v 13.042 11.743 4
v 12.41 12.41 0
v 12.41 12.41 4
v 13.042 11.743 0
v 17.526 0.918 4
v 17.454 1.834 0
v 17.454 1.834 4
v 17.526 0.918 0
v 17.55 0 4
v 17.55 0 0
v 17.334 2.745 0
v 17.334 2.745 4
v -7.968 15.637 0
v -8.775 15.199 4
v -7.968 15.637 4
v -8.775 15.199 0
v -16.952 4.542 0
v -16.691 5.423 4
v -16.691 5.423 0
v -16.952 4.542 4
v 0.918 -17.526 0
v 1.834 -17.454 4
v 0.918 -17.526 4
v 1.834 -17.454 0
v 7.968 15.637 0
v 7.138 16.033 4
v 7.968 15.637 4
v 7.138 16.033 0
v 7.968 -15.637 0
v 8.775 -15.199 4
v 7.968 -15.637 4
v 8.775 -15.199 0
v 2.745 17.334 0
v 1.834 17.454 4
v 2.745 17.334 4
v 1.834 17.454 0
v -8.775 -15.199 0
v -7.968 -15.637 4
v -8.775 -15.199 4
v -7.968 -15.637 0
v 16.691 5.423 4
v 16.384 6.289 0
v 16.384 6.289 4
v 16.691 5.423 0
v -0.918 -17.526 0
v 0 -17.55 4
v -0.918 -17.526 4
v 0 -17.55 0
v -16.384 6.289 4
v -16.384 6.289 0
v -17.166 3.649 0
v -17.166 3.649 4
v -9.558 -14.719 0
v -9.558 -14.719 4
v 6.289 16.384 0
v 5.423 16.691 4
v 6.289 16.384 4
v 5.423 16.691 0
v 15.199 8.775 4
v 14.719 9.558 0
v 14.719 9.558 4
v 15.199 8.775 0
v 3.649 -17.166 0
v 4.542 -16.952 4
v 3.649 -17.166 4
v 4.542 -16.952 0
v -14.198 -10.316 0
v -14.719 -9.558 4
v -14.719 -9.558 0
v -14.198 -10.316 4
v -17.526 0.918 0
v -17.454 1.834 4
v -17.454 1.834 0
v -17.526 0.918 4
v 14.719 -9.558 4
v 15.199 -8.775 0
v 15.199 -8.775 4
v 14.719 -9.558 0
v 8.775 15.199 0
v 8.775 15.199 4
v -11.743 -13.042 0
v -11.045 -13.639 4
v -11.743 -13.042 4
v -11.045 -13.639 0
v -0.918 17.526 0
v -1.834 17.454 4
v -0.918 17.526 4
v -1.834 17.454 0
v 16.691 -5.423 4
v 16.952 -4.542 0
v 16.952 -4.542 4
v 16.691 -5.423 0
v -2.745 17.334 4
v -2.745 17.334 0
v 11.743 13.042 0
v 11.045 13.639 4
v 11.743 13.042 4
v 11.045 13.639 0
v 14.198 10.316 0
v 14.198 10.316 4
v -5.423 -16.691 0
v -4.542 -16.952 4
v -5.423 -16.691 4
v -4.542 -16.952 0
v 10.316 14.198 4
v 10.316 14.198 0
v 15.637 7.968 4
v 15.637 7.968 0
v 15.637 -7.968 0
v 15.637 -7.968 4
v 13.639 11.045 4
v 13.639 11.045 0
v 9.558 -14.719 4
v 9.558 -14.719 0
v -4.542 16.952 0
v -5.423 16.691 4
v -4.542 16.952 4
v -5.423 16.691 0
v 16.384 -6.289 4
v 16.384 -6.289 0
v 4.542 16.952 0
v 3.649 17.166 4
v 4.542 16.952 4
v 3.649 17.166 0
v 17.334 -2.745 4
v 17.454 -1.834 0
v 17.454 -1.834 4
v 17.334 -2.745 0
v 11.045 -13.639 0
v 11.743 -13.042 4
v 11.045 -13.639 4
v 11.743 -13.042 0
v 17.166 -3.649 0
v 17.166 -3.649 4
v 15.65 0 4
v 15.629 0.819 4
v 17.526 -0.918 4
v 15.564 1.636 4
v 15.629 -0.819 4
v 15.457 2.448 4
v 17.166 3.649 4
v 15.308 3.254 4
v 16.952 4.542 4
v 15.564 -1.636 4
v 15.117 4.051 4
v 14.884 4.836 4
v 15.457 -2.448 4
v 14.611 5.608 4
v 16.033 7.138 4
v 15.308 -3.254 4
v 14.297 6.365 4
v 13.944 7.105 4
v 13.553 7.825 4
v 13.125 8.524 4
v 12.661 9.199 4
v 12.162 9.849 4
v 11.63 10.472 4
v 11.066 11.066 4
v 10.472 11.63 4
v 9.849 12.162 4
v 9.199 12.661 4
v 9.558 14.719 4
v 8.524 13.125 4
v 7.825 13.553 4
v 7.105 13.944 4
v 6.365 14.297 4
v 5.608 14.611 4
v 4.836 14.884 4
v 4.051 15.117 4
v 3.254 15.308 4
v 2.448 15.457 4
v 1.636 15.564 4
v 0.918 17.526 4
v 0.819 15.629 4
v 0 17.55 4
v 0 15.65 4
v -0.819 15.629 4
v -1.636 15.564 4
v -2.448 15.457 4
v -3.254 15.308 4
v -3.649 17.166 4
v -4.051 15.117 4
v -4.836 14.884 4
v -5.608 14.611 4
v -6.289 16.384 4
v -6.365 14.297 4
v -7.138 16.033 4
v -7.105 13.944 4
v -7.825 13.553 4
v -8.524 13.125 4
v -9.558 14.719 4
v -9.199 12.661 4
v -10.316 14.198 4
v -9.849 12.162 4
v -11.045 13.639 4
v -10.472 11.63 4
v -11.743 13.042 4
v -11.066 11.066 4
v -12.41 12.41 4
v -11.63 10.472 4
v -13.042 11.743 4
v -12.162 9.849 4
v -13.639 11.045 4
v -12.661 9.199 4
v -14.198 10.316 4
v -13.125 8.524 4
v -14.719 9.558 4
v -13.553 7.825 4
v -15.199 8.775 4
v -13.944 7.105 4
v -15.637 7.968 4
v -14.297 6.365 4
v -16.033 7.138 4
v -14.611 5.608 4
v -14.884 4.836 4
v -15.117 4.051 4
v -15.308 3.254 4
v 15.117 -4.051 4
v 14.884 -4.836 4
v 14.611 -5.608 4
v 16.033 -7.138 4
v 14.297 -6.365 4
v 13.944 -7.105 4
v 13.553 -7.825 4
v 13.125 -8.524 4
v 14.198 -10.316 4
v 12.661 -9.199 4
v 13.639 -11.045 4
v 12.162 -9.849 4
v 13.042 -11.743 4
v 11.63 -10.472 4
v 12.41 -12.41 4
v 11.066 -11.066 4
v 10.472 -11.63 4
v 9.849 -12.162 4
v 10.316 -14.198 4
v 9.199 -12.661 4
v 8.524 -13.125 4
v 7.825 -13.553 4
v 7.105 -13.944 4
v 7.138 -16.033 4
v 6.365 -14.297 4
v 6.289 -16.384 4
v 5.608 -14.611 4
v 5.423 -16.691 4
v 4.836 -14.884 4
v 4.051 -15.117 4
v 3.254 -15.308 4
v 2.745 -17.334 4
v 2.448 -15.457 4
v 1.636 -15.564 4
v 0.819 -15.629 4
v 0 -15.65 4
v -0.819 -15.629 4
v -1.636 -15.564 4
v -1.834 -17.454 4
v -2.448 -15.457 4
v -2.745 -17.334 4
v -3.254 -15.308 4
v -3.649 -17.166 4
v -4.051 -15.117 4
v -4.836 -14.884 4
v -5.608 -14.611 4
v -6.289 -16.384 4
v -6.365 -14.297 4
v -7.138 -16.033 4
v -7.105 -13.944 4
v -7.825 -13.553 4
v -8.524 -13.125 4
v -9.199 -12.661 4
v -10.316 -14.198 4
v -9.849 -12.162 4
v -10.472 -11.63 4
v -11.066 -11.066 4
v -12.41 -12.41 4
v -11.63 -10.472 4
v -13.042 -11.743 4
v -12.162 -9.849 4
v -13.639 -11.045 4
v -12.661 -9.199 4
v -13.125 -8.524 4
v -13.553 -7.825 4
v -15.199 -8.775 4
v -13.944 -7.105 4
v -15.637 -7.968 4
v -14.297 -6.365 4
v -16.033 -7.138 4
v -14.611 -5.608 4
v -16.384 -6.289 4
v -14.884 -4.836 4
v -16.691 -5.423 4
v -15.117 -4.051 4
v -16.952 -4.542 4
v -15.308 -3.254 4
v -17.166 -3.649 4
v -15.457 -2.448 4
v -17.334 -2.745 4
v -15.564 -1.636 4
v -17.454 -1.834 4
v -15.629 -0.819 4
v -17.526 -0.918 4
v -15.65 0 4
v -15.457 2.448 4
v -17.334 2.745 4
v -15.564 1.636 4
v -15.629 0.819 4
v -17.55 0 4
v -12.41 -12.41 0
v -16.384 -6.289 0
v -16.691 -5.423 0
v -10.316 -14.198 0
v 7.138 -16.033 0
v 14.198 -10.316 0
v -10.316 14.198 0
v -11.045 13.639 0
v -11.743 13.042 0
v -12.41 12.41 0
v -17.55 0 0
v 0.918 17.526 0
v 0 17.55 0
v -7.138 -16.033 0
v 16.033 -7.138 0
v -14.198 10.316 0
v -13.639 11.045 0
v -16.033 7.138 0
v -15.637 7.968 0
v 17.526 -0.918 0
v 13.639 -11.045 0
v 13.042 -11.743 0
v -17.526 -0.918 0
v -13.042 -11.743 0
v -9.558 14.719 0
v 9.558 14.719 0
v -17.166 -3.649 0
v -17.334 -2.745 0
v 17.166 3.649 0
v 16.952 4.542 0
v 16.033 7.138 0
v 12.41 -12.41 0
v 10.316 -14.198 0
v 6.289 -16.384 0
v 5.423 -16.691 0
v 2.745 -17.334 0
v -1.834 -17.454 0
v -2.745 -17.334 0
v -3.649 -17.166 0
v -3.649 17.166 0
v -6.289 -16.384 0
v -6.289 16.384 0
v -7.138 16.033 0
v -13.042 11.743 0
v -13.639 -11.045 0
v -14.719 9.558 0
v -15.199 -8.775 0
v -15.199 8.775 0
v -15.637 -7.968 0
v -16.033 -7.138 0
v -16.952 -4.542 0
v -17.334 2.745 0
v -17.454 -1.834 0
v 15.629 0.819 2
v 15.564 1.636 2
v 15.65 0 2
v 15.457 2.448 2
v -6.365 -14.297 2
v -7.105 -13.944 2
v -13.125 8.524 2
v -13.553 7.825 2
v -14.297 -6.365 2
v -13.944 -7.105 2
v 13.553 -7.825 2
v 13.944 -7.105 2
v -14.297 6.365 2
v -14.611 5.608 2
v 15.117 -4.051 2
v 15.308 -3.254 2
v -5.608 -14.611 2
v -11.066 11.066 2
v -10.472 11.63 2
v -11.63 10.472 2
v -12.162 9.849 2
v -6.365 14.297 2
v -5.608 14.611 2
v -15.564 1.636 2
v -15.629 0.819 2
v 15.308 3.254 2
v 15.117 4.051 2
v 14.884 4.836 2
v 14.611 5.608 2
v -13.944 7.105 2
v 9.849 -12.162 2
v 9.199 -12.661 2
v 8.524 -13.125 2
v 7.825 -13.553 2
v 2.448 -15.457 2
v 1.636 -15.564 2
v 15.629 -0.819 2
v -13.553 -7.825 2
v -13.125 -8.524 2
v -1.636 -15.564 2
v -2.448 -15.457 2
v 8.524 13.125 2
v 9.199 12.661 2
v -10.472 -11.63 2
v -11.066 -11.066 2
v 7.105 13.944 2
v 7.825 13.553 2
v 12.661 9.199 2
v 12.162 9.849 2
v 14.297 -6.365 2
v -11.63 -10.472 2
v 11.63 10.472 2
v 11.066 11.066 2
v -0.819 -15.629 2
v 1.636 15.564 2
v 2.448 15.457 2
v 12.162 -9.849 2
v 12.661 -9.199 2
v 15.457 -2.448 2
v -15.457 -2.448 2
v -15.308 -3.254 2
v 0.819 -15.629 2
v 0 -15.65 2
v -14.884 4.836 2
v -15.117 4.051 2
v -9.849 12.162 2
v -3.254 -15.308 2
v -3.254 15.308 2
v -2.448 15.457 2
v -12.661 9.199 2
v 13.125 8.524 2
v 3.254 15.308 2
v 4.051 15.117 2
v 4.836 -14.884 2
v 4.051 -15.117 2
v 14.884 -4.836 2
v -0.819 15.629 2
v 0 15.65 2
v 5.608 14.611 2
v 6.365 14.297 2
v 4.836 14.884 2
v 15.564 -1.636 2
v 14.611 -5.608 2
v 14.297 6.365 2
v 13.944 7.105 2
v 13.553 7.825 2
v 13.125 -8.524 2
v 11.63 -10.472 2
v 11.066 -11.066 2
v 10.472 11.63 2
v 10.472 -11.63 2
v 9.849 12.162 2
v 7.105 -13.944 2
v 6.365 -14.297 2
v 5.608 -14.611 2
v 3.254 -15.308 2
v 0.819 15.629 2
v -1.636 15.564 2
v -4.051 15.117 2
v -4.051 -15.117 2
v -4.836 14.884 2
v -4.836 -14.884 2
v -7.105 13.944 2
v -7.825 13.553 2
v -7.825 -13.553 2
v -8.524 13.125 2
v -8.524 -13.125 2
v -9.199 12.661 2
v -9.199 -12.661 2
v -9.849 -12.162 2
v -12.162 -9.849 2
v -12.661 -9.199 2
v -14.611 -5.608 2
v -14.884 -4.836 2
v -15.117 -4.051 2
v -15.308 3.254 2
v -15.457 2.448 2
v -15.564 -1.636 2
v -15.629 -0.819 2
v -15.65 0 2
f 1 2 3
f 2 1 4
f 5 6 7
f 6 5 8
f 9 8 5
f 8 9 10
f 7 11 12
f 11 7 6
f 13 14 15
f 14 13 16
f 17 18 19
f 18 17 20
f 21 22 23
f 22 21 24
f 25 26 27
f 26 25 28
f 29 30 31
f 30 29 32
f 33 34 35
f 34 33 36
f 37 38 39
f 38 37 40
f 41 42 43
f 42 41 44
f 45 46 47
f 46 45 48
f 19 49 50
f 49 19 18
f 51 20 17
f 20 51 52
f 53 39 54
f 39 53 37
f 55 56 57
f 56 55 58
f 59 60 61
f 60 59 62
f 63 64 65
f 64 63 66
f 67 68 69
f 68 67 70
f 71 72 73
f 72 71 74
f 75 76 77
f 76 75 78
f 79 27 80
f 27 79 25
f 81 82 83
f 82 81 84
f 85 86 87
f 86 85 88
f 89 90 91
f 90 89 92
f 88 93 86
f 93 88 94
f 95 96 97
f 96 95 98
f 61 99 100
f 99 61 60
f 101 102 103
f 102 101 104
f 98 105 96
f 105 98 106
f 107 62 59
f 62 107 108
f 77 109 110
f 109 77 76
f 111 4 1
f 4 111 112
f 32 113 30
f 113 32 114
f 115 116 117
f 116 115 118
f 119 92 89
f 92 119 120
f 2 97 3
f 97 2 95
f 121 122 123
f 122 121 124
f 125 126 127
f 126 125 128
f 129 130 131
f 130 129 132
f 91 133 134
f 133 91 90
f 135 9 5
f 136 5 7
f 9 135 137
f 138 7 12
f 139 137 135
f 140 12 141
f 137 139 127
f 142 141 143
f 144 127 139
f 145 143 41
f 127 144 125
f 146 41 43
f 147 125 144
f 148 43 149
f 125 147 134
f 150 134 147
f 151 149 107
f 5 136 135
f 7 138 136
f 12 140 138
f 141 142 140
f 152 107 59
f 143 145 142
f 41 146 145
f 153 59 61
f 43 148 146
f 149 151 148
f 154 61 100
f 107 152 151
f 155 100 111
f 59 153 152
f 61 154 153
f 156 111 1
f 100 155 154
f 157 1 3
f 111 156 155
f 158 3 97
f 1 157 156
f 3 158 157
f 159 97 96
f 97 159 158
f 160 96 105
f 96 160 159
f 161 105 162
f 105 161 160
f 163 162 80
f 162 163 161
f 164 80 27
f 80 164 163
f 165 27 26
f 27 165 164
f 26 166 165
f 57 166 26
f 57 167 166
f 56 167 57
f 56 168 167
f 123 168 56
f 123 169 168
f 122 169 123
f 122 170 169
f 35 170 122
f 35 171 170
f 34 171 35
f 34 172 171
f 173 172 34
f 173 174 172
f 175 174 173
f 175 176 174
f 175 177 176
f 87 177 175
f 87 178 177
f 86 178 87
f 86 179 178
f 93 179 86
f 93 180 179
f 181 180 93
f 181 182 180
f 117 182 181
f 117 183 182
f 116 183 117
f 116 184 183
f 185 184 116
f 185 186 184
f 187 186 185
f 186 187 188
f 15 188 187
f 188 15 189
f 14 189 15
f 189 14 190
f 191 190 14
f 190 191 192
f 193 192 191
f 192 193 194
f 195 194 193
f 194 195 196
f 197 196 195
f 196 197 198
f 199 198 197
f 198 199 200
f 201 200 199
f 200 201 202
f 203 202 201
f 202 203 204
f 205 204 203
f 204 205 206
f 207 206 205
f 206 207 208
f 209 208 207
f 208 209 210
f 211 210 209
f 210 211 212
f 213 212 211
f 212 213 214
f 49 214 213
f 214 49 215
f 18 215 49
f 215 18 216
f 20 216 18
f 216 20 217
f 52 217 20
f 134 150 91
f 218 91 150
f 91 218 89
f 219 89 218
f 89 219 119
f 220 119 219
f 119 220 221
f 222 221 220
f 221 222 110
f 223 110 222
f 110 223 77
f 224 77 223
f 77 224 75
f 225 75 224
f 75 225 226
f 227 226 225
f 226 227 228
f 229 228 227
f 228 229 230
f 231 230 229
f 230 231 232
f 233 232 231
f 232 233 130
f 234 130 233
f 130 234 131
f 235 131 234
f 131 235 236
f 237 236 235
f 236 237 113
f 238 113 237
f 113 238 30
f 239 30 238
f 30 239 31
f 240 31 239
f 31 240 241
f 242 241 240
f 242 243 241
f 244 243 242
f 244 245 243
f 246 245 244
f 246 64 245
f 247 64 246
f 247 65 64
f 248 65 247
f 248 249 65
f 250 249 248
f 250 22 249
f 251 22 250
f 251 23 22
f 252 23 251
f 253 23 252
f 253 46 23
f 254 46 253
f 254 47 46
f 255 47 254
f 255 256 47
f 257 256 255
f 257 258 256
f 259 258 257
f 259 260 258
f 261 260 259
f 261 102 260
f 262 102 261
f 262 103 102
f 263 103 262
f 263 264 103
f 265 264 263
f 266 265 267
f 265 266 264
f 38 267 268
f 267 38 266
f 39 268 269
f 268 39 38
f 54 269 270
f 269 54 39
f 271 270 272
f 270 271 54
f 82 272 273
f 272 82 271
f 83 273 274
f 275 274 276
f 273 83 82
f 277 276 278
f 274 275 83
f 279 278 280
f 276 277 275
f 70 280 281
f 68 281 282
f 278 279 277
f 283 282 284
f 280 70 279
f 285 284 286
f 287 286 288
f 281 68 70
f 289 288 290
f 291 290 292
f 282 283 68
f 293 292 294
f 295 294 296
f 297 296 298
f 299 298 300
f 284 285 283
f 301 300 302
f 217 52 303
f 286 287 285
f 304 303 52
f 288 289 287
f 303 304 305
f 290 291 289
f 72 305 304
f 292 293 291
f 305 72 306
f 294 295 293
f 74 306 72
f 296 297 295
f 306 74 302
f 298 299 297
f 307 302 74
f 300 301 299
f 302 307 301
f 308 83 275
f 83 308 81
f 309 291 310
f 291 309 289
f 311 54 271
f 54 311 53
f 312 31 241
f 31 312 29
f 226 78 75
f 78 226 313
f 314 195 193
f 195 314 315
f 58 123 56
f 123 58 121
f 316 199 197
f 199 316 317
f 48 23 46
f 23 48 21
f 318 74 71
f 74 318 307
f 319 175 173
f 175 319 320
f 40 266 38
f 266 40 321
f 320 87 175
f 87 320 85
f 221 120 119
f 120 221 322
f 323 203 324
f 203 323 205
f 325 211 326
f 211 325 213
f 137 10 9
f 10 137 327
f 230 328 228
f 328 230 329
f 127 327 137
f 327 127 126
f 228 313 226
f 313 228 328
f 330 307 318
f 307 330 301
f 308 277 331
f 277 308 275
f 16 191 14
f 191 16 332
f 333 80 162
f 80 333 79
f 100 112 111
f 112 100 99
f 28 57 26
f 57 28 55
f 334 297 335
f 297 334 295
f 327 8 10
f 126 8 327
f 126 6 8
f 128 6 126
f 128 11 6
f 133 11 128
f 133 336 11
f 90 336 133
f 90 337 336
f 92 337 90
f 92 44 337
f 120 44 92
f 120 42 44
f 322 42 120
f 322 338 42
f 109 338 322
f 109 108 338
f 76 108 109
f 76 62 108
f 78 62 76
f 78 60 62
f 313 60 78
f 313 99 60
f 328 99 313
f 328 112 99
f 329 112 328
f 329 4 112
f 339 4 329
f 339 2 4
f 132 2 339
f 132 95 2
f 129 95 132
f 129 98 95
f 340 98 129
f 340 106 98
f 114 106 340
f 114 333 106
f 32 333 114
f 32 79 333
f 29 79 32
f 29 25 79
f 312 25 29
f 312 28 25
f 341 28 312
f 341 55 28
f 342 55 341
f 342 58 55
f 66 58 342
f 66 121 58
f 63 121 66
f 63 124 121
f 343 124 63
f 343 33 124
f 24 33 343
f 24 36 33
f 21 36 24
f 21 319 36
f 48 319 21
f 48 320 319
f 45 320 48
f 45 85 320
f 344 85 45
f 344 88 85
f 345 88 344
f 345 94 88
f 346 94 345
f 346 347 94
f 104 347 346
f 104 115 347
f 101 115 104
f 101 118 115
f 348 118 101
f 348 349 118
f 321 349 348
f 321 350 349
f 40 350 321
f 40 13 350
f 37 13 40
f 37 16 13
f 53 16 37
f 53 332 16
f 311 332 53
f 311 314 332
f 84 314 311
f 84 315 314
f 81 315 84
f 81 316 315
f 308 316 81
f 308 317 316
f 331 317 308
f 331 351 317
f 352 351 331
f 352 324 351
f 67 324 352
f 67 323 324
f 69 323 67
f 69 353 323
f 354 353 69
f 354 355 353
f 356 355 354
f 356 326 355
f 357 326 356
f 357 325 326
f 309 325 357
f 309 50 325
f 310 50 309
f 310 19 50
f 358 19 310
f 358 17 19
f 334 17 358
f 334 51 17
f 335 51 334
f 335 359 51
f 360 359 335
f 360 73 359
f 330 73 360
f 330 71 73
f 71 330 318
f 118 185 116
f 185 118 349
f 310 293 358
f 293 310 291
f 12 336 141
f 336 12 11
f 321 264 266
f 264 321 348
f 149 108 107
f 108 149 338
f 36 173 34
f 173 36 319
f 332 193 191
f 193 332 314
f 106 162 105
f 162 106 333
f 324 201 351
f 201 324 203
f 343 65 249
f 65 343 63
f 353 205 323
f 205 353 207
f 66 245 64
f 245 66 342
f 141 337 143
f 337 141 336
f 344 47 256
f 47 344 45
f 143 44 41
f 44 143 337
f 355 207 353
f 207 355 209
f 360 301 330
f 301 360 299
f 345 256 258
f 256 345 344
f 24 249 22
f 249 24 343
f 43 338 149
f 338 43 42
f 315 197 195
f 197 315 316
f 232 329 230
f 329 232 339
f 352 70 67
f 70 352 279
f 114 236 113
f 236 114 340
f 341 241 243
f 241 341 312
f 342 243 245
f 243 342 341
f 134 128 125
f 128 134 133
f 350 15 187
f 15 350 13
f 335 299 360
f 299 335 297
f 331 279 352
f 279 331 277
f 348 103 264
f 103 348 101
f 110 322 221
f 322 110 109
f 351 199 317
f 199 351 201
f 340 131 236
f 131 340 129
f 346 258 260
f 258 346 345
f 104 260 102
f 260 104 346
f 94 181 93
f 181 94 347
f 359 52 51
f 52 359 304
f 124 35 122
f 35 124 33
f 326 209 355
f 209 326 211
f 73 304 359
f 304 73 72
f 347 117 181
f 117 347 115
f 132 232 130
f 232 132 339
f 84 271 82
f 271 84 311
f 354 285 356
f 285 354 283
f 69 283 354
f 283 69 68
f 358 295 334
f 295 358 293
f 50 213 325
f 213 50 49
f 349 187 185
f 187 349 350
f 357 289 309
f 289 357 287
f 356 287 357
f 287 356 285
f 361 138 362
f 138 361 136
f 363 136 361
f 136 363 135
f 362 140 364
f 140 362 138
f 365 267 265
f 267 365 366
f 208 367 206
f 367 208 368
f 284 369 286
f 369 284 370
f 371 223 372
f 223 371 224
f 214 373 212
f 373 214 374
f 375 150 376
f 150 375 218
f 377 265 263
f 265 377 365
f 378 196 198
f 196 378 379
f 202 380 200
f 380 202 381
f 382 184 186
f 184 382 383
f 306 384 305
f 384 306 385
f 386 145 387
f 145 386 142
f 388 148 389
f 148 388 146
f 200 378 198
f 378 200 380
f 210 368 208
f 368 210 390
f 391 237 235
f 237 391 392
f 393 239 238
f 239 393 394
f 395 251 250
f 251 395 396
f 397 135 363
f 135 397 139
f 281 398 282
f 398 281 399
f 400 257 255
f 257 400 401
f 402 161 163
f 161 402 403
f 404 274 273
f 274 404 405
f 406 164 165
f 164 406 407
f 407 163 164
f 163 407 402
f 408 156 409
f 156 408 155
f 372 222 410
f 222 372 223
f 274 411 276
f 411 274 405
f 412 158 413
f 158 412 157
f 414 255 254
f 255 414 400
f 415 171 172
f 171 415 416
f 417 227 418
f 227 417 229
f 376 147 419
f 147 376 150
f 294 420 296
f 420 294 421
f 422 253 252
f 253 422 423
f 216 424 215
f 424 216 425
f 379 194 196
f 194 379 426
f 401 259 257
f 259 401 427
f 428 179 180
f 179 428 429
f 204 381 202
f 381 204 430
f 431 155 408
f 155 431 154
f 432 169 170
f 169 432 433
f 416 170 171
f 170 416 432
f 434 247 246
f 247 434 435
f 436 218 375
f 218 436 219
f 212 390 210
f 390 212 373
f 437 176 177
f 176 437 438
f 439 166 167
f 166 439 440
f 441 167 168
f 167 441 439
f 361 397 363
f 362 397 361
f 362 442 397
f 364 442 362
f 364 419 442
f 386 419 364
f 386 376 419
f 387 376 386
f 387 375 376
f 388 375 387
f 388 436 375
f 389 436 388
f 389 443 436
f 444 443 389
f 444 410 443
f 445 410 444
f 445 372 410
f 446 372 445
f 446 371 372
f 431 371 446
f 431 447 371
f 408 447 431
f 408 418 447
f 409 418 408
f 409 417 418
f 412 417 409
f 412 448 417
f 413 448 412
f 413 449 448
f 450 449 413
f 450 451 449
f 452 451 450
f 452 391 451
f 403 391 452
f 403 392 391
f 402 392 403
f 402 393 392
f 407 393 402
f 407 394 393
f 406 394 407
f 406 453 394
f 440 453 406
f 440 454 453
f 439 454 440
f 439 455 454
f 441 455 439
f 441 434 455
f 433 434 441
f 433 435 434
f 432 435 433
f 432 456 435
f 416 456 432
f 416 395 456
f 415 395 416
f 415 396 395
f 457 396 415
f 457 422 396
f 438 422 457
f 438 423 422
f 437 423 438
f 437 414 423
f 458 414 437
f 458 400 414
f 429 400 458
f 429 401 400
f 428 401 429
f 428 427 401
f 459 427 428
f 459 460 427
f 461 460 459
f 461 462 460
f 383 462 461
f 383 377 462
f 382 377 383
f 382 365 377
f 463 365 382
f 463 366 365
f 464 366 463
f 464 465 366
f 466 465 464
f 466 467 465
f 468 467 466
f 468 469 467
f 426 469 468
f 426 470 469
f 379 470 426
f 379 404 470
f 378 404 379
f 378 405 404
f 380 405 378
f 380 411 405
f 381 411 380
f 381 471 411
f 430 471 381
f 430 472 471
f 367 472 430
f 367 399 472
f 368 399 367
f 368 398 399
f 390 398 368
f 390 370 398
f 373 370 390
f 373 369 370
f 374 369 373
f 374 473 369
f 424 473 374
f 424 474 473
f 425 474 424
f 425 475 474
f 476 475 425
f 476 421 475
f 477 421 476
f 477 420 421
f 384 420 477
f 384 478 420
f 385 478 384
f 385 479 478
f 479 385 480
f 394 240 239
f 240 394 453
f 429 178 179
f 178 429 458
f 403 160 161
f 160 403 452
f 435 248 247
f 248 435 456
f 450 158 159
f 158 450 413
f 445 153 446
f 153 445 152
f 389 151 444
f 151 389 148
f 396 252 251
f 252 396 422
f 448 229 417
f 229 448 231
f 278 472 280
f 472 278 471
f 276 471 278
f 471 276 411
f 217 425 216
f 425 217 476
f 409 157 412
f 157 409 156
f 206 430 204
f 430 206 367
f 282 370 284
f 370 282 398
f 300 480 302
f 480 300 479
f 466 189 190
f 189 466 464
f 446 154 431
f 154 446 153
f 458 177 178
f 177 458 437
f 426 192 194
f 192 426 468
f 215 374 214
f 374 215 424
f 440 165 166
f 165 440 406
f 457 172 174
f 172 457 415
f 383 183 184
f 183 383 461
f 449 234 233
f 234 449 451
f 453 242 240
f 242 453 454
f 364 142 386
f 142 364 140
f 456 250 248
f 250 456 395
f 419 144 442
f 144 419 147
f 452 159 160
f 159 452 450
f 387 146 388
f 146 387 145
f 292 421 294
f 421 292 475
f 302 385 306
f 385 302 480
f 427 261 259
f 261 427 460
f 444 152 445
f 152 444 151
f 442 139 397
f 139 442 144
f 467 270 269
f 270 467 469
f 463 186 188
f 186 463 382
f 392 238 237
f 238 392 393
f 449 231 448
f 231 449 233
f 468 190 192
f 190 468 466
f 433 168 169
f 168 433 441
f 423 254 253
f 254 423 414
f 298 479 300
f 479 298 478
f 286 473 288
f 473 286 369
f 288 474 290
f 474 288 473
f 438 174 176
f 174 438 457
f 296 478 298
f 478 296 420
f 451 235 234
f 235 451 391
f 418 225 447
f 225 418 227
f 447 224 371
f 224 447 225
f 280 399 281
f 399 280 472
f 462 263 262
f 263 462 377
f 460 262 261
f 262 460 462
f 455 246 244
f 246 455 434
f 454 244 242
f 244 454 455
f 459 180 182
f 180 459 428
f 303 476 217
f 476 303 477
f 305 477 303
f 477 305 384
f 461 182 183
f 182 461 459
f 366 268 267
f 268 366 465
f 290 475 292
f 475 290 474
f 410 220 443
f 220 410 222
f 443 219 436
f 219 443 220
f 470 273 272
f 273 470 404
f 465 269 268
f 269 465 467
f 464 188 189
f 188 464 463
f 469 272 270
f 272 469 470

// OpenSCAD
module round_cap(
    inner_diameter = 31.1,
    inner_depth = 2,
    outer_diameter = 31.1 + 2 * 2,
    outer_depth = 2 + 2,

    tolerance = 0
) {
    e = .014;

    difference() {
        cylinder(
            d = outer_diameter,
            h = outer_depth
        );

        translate([0, 0, outer_depth - inner_depth]) {
            cylinder(
                d = inner_diameter + tolerance * 2,
                h = inner_depth + e
            );
        }
    }
}

round_cap($fn = 120, tolerance = .1);
